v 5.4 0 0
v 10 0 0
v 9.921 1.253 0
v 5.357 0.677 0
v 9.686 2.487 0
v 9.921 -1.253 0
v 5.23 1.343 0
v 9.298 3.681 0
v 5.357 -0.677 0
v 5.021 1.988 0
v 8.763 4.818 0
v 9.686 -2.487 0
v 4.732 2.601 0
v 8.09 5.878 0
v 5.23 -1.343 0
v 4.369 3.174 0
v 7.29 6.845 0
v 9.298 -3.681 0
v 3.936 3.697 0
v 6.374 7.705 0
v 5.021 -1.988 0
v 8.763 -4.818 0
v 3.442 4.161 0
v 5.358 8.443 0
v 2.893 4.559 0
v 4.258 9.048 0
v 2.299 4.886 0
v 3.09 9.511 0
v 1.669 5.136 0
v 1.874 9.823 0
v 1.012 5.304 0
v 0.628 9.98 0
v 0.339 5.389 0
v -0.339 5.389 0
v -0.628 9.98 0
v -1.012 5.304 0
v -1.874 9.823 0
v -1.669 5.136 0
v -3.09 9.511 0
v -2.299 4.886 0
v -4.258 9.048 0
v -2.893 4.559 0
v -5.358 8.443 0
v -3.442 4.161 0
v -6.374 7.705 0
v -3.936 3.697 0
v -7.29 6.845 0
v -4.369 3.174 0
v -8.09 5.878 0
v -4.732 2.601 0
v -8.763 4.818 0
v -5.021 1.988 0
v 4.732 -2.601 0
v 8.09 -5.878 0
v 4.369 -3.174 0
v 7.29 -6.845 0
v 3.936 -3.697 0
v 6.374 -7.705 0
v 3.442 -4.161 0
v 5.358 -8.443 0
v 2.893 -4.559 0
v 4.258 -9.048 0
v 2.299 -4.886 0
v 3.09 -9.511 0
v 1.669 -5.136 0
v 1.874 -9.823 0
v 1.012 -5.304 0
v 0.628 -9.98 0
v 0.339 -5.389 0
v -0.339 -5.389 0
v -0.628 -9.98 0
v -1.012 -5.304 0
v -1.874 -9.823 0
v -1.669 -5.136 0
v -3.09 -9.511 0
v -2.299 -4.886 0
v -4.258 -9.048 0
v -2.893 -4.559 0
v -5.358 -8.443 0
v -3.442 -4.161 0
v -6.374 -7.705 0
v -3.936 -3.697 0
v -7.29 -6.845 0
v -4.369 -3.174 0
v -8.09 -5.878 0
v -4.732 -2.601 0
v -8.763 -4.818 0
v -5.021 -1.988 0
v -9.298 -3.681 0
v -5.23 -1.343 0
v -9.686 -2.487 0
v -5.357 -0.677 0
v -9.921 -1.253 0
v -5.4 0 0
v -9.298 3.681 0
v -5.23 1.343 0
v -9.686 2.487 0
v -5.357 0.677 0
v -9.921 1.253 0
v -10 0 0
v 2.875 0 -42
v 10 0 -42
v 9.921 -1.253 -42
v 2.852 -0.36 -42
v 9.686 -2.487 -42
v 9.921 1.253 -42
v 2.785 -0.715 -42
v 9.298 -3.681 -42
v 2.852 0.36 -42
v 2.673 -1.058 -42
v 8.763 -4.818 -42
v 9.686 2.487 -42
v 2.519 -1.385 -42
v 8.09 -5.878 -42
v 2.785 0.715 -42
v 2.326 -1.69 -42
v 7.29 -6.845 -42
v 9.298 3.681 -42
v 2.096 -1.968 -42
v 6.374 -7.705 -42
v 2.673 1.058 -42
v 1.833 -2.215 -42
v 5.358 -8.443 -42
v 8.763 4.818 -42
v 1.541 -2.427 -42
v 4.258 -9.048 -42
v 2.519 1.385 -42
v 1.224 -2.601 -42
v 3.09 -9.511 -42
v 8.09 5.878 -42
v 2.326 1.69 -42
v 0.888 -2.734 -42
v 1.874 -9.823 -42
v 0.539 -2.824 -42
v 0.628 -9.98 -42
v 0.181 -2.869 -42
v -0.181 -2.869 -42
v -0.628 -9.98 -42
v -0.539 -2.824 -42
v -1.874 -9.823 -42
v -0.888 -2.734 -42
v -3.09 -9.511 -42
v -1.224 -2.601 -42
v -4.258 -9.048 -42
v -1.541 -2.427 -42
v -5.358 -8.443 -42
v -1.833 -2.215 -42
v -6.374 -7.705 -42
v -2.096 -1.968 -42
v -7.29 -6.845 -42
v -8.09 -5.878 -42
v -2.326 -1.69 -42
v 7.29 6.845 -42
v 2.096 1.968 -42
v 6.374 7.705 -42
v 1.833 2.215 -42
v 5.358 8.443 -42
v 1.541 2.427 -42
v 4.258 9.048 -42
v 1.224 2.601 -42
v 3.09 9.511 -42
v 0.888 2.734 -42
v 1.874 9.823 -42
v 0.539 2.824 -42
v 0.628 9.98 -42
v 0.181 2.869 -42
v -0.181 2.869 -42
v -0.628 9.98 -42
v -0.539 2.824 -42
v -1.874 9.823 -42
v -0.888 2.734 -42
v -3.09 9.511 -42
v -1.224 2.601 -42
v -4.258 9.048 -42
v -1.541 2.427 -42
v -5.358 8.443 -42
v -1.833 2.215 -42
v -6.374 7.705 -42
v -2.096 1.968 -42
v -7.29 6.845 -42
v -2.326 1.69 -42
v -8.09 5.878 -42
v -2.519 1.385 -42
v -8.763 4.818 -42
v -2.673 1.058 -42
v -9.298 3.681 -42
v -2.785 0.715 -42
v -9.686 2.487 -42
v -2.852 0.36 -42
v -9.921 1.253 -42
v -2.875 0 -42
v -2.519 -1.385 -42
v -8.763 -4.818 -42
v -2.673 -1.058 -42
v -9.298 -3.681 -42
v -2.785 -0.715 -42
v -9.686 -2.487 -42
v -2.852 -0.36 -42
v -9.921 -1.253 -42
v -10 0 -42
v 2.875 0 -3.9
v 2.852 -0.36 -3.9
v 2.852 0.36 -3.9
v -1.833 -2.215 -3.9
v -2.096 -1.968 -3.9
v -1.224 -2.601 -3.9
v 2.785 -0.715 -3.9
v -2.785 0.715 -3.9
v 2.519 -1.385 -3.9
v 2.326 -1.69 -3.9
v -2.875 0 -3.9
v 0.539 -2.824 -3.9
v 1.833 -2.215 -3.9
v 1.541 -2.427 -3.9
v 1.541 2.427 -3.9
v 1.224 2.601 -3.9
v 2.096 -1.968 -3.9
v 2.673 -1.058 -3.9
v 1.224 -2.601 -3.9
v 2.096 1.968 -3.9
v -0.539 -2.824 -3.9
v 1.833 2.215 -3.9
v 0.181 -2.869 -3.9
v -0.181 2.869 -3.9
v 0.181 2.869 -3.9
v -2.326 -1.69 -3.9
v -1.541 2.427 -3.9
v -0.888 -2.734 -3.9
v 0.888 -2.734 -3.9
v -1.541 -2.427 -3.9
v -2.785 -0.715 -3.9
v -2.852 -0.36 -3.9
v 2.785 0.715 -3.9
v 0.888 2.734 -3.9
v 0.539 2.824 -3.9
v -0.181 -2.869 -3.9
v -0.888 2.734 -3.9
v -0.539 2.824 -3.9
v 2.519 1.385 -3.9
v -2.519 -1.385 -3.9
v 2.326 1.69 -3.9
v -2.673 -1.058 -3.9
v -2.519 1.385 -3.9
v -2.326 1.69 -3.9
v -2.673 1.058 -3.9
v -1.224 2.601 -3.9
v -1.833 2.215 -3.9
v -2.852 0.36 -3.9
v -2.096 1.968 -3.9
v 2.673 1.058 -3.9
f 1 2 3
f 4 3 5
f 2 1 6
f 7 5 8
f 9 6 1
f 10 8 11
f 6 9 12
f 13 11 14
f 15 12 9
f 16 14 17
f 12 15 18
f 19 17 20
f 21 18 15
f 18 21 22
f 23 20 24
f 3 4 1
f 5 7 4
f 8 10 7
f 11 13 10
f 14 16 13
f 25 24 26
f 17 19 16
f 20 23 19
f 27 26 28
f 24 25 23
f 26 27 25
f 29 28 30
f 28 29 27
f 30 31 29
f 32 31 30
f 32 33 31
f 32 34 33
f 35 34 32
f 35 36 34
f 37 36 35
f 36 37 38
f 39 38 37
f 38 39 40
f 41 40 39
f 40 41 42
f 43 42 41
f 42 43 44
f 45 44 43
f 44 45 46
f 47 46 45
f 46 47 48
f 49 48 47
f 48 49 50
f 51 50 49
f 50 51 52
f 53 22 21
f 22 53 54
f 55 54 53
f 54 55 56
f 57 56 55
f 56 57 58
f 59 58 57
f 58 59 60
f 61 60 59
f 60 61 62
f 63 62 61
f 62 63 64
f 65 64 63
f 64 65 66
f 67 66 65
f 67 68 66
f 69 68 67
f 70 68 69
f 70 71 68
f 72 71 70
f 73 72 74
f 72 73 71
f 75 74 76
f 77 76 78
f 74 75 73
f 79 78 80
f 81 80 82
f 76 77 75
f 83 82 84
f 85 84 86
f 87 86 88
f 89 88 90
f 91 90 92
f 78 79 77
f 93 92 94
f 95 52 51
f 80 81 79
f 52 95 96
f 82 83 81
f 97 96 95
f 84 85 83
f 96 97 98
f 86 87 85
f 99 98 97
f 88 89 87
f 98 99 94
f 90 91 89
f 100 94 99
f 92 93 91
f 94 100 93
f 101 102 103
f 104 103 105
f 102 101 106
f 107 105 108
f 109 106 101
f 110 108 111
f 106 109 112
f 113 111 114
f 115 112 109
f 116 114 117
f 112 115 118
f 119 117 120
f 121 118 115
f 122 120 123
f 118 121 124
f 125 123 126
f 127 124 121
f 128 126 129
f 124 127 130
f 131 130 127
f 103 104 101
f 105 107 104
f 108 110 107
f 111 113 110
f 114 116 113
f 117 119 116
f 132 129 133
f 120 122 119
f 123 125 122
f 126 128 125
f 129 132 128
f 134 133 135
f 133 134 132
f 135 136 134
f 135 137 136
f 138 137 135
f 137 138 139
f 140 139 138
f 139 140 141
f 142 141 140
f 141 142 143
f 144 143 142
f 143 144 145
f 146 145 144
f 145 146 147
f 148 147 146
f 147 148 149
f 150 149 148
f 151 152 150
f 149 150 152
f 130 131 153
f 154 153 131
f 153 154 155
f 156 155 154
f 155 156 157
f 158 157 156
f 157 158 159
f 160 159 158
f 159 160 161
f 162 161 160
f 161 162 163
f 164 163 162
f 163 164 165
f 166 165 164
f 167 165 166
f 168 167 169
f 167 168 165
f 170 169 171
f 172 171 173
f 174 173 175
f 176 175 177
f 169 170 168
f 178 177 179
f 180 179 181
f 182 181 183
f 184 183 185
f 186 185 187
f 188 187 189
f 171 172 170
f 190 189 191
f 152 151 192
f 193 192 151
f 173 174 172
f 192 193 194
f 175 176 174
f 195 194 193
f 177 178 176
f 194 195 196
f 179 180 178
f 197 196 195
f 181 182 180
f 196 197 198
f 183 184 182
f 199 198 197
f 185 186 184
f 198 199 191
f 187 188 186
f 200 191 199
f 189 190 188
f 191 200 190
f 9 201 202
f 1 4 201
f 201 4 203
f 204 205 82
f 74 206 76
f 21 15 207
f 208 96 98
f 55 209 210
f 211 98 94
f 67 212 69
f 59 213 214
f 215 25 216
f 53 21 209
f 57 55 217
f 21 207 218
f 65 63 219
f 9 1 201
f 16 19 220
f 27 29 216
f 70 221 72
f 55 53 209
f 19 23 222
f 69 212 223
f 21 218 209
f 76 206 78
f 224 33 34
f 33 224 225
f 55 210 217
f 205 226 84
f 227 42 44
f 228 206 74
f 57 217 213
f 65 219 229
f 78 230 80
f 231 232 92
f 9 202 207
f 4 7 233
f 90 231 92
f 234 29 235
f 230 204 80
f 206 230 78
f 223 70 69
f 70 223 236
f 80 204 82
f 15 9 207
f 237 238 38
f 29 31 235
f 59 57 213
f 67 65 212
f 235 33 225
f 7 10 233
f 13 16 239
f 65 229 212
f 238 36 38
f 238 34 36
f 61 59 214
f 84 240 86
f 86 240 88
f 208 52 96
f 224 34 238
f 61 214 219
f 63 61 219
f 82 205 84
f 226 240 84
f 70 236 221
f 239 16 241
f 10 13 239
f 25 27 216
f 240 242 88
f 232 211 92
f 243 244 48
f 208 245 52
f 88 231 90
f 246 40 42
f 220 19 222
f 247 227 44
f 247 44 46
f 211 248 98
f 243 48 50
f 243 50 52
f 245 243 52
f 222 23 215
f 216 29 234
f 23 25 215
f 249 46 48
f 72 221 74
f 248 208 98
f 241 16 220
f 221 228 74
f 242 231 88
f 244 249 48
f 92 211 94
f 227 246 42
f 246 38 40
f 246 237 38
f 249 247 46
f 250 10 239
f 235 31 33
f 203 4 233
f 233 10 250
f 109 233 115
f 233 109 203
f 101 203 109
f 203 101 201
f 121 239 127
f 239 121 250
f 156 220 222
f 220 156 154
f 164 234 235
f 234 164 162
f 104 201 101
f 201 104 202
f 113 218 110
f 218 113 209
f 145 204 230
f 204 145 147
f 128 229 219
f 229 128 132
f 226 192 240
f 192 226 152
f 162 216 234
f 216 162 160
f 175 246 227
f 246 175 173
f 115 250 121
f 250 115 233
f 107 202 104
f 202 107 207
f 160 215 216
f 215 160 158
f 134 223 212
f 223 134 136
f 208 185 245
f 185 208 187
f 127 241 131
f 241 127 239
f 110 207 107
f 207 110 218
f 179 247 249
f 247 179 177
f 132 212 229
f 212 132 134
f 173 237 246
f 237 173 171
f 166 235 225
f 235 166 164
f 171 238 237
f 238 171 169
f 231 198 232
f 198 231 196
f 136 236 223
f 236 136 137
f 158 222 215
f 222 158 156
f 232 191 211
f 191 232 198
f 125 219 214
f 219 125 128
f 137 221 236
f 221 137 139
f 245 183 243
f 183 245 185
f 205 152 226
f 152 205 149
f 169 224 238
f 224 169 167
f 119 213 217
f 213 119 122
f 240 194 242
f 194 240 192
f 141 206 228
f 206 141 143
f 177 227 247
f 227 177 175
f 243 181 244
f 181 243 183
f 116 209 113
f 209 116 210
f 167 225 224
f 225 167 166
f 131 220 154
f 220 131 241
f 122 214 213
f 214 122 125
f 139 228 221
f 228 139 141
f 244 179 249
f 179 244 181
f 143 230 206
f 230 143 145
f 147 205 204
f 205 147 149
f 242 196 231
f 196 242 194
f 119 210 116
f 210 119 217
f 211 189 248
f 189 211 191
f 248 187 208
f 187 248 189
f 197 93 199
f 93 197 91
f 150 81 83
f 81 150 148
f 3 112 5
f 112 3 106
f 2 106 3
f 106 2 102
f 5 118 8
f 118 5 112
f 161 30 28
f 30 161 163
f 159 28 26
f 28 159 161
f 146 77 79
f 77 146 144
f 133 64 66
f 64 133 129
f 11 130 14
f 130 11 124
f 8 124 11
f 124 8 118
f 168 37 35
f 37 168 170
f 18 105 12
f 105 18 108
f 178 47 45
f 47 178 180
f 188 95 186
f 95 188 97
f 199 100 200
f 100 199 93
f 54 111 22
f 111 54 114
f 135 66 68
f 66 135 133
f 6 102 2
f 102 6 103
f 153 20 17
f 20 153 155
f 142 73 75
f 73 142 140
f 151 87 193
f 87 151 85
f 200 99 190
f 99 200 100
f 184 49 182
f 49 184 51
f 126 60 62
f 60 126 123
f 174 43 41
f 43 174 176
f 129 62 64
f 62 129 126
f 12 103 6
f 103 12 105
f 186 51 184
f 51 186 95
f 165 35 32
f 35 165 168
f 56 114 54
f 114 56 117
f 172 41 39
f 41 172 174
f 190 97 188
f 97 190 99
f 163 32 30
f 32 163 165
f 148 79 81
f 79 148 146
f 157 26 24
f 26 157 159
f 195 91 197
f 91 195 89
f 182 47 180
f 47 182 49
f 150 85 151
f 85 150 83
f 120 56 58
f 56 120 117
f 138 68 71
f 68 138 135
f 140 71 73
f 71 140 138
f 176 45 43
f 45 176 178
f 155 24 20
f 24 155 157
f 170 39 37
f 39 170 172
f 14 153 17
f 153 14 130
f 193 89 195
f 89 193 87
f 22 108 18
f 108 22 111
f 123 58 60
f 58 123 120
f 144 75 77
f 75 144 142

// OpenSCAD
$fn = 50;


difference() {
	union() {
		translate(v = [0, 0, -42.0000000000]) {
			cylinder(h = 42, r = 10.0000000000);
		}
		cylinder(h = 0, r = 13.0000000000);
	}
	union() {
		translate(v = [0, 0, 0]) {
			rotate(a = [0, 0, 0]) {
				difference() {
					union() {
						#translate(v = [0, 0, -42.0000000000]) {
							cylinder(h = 42, r = 2.6000000000);
						}
						#translate(v = [0, 0, -3.9000000000]) {
							cylinder(h = 3.9000000000, r1 = 2.8750000000, r2 = 5.4000000000);
						}
						#translate(v = [0, 0, -42.0000000000]) {
							cylinder(h = 42, r = 2.8750000000);
						}
						#translate(v = [0, 0, -42.0000000000]) {
							cylinder(h = 42, r = 2.6000000000);
						}
					}
					union();
				}
			}
		}
	}
}
